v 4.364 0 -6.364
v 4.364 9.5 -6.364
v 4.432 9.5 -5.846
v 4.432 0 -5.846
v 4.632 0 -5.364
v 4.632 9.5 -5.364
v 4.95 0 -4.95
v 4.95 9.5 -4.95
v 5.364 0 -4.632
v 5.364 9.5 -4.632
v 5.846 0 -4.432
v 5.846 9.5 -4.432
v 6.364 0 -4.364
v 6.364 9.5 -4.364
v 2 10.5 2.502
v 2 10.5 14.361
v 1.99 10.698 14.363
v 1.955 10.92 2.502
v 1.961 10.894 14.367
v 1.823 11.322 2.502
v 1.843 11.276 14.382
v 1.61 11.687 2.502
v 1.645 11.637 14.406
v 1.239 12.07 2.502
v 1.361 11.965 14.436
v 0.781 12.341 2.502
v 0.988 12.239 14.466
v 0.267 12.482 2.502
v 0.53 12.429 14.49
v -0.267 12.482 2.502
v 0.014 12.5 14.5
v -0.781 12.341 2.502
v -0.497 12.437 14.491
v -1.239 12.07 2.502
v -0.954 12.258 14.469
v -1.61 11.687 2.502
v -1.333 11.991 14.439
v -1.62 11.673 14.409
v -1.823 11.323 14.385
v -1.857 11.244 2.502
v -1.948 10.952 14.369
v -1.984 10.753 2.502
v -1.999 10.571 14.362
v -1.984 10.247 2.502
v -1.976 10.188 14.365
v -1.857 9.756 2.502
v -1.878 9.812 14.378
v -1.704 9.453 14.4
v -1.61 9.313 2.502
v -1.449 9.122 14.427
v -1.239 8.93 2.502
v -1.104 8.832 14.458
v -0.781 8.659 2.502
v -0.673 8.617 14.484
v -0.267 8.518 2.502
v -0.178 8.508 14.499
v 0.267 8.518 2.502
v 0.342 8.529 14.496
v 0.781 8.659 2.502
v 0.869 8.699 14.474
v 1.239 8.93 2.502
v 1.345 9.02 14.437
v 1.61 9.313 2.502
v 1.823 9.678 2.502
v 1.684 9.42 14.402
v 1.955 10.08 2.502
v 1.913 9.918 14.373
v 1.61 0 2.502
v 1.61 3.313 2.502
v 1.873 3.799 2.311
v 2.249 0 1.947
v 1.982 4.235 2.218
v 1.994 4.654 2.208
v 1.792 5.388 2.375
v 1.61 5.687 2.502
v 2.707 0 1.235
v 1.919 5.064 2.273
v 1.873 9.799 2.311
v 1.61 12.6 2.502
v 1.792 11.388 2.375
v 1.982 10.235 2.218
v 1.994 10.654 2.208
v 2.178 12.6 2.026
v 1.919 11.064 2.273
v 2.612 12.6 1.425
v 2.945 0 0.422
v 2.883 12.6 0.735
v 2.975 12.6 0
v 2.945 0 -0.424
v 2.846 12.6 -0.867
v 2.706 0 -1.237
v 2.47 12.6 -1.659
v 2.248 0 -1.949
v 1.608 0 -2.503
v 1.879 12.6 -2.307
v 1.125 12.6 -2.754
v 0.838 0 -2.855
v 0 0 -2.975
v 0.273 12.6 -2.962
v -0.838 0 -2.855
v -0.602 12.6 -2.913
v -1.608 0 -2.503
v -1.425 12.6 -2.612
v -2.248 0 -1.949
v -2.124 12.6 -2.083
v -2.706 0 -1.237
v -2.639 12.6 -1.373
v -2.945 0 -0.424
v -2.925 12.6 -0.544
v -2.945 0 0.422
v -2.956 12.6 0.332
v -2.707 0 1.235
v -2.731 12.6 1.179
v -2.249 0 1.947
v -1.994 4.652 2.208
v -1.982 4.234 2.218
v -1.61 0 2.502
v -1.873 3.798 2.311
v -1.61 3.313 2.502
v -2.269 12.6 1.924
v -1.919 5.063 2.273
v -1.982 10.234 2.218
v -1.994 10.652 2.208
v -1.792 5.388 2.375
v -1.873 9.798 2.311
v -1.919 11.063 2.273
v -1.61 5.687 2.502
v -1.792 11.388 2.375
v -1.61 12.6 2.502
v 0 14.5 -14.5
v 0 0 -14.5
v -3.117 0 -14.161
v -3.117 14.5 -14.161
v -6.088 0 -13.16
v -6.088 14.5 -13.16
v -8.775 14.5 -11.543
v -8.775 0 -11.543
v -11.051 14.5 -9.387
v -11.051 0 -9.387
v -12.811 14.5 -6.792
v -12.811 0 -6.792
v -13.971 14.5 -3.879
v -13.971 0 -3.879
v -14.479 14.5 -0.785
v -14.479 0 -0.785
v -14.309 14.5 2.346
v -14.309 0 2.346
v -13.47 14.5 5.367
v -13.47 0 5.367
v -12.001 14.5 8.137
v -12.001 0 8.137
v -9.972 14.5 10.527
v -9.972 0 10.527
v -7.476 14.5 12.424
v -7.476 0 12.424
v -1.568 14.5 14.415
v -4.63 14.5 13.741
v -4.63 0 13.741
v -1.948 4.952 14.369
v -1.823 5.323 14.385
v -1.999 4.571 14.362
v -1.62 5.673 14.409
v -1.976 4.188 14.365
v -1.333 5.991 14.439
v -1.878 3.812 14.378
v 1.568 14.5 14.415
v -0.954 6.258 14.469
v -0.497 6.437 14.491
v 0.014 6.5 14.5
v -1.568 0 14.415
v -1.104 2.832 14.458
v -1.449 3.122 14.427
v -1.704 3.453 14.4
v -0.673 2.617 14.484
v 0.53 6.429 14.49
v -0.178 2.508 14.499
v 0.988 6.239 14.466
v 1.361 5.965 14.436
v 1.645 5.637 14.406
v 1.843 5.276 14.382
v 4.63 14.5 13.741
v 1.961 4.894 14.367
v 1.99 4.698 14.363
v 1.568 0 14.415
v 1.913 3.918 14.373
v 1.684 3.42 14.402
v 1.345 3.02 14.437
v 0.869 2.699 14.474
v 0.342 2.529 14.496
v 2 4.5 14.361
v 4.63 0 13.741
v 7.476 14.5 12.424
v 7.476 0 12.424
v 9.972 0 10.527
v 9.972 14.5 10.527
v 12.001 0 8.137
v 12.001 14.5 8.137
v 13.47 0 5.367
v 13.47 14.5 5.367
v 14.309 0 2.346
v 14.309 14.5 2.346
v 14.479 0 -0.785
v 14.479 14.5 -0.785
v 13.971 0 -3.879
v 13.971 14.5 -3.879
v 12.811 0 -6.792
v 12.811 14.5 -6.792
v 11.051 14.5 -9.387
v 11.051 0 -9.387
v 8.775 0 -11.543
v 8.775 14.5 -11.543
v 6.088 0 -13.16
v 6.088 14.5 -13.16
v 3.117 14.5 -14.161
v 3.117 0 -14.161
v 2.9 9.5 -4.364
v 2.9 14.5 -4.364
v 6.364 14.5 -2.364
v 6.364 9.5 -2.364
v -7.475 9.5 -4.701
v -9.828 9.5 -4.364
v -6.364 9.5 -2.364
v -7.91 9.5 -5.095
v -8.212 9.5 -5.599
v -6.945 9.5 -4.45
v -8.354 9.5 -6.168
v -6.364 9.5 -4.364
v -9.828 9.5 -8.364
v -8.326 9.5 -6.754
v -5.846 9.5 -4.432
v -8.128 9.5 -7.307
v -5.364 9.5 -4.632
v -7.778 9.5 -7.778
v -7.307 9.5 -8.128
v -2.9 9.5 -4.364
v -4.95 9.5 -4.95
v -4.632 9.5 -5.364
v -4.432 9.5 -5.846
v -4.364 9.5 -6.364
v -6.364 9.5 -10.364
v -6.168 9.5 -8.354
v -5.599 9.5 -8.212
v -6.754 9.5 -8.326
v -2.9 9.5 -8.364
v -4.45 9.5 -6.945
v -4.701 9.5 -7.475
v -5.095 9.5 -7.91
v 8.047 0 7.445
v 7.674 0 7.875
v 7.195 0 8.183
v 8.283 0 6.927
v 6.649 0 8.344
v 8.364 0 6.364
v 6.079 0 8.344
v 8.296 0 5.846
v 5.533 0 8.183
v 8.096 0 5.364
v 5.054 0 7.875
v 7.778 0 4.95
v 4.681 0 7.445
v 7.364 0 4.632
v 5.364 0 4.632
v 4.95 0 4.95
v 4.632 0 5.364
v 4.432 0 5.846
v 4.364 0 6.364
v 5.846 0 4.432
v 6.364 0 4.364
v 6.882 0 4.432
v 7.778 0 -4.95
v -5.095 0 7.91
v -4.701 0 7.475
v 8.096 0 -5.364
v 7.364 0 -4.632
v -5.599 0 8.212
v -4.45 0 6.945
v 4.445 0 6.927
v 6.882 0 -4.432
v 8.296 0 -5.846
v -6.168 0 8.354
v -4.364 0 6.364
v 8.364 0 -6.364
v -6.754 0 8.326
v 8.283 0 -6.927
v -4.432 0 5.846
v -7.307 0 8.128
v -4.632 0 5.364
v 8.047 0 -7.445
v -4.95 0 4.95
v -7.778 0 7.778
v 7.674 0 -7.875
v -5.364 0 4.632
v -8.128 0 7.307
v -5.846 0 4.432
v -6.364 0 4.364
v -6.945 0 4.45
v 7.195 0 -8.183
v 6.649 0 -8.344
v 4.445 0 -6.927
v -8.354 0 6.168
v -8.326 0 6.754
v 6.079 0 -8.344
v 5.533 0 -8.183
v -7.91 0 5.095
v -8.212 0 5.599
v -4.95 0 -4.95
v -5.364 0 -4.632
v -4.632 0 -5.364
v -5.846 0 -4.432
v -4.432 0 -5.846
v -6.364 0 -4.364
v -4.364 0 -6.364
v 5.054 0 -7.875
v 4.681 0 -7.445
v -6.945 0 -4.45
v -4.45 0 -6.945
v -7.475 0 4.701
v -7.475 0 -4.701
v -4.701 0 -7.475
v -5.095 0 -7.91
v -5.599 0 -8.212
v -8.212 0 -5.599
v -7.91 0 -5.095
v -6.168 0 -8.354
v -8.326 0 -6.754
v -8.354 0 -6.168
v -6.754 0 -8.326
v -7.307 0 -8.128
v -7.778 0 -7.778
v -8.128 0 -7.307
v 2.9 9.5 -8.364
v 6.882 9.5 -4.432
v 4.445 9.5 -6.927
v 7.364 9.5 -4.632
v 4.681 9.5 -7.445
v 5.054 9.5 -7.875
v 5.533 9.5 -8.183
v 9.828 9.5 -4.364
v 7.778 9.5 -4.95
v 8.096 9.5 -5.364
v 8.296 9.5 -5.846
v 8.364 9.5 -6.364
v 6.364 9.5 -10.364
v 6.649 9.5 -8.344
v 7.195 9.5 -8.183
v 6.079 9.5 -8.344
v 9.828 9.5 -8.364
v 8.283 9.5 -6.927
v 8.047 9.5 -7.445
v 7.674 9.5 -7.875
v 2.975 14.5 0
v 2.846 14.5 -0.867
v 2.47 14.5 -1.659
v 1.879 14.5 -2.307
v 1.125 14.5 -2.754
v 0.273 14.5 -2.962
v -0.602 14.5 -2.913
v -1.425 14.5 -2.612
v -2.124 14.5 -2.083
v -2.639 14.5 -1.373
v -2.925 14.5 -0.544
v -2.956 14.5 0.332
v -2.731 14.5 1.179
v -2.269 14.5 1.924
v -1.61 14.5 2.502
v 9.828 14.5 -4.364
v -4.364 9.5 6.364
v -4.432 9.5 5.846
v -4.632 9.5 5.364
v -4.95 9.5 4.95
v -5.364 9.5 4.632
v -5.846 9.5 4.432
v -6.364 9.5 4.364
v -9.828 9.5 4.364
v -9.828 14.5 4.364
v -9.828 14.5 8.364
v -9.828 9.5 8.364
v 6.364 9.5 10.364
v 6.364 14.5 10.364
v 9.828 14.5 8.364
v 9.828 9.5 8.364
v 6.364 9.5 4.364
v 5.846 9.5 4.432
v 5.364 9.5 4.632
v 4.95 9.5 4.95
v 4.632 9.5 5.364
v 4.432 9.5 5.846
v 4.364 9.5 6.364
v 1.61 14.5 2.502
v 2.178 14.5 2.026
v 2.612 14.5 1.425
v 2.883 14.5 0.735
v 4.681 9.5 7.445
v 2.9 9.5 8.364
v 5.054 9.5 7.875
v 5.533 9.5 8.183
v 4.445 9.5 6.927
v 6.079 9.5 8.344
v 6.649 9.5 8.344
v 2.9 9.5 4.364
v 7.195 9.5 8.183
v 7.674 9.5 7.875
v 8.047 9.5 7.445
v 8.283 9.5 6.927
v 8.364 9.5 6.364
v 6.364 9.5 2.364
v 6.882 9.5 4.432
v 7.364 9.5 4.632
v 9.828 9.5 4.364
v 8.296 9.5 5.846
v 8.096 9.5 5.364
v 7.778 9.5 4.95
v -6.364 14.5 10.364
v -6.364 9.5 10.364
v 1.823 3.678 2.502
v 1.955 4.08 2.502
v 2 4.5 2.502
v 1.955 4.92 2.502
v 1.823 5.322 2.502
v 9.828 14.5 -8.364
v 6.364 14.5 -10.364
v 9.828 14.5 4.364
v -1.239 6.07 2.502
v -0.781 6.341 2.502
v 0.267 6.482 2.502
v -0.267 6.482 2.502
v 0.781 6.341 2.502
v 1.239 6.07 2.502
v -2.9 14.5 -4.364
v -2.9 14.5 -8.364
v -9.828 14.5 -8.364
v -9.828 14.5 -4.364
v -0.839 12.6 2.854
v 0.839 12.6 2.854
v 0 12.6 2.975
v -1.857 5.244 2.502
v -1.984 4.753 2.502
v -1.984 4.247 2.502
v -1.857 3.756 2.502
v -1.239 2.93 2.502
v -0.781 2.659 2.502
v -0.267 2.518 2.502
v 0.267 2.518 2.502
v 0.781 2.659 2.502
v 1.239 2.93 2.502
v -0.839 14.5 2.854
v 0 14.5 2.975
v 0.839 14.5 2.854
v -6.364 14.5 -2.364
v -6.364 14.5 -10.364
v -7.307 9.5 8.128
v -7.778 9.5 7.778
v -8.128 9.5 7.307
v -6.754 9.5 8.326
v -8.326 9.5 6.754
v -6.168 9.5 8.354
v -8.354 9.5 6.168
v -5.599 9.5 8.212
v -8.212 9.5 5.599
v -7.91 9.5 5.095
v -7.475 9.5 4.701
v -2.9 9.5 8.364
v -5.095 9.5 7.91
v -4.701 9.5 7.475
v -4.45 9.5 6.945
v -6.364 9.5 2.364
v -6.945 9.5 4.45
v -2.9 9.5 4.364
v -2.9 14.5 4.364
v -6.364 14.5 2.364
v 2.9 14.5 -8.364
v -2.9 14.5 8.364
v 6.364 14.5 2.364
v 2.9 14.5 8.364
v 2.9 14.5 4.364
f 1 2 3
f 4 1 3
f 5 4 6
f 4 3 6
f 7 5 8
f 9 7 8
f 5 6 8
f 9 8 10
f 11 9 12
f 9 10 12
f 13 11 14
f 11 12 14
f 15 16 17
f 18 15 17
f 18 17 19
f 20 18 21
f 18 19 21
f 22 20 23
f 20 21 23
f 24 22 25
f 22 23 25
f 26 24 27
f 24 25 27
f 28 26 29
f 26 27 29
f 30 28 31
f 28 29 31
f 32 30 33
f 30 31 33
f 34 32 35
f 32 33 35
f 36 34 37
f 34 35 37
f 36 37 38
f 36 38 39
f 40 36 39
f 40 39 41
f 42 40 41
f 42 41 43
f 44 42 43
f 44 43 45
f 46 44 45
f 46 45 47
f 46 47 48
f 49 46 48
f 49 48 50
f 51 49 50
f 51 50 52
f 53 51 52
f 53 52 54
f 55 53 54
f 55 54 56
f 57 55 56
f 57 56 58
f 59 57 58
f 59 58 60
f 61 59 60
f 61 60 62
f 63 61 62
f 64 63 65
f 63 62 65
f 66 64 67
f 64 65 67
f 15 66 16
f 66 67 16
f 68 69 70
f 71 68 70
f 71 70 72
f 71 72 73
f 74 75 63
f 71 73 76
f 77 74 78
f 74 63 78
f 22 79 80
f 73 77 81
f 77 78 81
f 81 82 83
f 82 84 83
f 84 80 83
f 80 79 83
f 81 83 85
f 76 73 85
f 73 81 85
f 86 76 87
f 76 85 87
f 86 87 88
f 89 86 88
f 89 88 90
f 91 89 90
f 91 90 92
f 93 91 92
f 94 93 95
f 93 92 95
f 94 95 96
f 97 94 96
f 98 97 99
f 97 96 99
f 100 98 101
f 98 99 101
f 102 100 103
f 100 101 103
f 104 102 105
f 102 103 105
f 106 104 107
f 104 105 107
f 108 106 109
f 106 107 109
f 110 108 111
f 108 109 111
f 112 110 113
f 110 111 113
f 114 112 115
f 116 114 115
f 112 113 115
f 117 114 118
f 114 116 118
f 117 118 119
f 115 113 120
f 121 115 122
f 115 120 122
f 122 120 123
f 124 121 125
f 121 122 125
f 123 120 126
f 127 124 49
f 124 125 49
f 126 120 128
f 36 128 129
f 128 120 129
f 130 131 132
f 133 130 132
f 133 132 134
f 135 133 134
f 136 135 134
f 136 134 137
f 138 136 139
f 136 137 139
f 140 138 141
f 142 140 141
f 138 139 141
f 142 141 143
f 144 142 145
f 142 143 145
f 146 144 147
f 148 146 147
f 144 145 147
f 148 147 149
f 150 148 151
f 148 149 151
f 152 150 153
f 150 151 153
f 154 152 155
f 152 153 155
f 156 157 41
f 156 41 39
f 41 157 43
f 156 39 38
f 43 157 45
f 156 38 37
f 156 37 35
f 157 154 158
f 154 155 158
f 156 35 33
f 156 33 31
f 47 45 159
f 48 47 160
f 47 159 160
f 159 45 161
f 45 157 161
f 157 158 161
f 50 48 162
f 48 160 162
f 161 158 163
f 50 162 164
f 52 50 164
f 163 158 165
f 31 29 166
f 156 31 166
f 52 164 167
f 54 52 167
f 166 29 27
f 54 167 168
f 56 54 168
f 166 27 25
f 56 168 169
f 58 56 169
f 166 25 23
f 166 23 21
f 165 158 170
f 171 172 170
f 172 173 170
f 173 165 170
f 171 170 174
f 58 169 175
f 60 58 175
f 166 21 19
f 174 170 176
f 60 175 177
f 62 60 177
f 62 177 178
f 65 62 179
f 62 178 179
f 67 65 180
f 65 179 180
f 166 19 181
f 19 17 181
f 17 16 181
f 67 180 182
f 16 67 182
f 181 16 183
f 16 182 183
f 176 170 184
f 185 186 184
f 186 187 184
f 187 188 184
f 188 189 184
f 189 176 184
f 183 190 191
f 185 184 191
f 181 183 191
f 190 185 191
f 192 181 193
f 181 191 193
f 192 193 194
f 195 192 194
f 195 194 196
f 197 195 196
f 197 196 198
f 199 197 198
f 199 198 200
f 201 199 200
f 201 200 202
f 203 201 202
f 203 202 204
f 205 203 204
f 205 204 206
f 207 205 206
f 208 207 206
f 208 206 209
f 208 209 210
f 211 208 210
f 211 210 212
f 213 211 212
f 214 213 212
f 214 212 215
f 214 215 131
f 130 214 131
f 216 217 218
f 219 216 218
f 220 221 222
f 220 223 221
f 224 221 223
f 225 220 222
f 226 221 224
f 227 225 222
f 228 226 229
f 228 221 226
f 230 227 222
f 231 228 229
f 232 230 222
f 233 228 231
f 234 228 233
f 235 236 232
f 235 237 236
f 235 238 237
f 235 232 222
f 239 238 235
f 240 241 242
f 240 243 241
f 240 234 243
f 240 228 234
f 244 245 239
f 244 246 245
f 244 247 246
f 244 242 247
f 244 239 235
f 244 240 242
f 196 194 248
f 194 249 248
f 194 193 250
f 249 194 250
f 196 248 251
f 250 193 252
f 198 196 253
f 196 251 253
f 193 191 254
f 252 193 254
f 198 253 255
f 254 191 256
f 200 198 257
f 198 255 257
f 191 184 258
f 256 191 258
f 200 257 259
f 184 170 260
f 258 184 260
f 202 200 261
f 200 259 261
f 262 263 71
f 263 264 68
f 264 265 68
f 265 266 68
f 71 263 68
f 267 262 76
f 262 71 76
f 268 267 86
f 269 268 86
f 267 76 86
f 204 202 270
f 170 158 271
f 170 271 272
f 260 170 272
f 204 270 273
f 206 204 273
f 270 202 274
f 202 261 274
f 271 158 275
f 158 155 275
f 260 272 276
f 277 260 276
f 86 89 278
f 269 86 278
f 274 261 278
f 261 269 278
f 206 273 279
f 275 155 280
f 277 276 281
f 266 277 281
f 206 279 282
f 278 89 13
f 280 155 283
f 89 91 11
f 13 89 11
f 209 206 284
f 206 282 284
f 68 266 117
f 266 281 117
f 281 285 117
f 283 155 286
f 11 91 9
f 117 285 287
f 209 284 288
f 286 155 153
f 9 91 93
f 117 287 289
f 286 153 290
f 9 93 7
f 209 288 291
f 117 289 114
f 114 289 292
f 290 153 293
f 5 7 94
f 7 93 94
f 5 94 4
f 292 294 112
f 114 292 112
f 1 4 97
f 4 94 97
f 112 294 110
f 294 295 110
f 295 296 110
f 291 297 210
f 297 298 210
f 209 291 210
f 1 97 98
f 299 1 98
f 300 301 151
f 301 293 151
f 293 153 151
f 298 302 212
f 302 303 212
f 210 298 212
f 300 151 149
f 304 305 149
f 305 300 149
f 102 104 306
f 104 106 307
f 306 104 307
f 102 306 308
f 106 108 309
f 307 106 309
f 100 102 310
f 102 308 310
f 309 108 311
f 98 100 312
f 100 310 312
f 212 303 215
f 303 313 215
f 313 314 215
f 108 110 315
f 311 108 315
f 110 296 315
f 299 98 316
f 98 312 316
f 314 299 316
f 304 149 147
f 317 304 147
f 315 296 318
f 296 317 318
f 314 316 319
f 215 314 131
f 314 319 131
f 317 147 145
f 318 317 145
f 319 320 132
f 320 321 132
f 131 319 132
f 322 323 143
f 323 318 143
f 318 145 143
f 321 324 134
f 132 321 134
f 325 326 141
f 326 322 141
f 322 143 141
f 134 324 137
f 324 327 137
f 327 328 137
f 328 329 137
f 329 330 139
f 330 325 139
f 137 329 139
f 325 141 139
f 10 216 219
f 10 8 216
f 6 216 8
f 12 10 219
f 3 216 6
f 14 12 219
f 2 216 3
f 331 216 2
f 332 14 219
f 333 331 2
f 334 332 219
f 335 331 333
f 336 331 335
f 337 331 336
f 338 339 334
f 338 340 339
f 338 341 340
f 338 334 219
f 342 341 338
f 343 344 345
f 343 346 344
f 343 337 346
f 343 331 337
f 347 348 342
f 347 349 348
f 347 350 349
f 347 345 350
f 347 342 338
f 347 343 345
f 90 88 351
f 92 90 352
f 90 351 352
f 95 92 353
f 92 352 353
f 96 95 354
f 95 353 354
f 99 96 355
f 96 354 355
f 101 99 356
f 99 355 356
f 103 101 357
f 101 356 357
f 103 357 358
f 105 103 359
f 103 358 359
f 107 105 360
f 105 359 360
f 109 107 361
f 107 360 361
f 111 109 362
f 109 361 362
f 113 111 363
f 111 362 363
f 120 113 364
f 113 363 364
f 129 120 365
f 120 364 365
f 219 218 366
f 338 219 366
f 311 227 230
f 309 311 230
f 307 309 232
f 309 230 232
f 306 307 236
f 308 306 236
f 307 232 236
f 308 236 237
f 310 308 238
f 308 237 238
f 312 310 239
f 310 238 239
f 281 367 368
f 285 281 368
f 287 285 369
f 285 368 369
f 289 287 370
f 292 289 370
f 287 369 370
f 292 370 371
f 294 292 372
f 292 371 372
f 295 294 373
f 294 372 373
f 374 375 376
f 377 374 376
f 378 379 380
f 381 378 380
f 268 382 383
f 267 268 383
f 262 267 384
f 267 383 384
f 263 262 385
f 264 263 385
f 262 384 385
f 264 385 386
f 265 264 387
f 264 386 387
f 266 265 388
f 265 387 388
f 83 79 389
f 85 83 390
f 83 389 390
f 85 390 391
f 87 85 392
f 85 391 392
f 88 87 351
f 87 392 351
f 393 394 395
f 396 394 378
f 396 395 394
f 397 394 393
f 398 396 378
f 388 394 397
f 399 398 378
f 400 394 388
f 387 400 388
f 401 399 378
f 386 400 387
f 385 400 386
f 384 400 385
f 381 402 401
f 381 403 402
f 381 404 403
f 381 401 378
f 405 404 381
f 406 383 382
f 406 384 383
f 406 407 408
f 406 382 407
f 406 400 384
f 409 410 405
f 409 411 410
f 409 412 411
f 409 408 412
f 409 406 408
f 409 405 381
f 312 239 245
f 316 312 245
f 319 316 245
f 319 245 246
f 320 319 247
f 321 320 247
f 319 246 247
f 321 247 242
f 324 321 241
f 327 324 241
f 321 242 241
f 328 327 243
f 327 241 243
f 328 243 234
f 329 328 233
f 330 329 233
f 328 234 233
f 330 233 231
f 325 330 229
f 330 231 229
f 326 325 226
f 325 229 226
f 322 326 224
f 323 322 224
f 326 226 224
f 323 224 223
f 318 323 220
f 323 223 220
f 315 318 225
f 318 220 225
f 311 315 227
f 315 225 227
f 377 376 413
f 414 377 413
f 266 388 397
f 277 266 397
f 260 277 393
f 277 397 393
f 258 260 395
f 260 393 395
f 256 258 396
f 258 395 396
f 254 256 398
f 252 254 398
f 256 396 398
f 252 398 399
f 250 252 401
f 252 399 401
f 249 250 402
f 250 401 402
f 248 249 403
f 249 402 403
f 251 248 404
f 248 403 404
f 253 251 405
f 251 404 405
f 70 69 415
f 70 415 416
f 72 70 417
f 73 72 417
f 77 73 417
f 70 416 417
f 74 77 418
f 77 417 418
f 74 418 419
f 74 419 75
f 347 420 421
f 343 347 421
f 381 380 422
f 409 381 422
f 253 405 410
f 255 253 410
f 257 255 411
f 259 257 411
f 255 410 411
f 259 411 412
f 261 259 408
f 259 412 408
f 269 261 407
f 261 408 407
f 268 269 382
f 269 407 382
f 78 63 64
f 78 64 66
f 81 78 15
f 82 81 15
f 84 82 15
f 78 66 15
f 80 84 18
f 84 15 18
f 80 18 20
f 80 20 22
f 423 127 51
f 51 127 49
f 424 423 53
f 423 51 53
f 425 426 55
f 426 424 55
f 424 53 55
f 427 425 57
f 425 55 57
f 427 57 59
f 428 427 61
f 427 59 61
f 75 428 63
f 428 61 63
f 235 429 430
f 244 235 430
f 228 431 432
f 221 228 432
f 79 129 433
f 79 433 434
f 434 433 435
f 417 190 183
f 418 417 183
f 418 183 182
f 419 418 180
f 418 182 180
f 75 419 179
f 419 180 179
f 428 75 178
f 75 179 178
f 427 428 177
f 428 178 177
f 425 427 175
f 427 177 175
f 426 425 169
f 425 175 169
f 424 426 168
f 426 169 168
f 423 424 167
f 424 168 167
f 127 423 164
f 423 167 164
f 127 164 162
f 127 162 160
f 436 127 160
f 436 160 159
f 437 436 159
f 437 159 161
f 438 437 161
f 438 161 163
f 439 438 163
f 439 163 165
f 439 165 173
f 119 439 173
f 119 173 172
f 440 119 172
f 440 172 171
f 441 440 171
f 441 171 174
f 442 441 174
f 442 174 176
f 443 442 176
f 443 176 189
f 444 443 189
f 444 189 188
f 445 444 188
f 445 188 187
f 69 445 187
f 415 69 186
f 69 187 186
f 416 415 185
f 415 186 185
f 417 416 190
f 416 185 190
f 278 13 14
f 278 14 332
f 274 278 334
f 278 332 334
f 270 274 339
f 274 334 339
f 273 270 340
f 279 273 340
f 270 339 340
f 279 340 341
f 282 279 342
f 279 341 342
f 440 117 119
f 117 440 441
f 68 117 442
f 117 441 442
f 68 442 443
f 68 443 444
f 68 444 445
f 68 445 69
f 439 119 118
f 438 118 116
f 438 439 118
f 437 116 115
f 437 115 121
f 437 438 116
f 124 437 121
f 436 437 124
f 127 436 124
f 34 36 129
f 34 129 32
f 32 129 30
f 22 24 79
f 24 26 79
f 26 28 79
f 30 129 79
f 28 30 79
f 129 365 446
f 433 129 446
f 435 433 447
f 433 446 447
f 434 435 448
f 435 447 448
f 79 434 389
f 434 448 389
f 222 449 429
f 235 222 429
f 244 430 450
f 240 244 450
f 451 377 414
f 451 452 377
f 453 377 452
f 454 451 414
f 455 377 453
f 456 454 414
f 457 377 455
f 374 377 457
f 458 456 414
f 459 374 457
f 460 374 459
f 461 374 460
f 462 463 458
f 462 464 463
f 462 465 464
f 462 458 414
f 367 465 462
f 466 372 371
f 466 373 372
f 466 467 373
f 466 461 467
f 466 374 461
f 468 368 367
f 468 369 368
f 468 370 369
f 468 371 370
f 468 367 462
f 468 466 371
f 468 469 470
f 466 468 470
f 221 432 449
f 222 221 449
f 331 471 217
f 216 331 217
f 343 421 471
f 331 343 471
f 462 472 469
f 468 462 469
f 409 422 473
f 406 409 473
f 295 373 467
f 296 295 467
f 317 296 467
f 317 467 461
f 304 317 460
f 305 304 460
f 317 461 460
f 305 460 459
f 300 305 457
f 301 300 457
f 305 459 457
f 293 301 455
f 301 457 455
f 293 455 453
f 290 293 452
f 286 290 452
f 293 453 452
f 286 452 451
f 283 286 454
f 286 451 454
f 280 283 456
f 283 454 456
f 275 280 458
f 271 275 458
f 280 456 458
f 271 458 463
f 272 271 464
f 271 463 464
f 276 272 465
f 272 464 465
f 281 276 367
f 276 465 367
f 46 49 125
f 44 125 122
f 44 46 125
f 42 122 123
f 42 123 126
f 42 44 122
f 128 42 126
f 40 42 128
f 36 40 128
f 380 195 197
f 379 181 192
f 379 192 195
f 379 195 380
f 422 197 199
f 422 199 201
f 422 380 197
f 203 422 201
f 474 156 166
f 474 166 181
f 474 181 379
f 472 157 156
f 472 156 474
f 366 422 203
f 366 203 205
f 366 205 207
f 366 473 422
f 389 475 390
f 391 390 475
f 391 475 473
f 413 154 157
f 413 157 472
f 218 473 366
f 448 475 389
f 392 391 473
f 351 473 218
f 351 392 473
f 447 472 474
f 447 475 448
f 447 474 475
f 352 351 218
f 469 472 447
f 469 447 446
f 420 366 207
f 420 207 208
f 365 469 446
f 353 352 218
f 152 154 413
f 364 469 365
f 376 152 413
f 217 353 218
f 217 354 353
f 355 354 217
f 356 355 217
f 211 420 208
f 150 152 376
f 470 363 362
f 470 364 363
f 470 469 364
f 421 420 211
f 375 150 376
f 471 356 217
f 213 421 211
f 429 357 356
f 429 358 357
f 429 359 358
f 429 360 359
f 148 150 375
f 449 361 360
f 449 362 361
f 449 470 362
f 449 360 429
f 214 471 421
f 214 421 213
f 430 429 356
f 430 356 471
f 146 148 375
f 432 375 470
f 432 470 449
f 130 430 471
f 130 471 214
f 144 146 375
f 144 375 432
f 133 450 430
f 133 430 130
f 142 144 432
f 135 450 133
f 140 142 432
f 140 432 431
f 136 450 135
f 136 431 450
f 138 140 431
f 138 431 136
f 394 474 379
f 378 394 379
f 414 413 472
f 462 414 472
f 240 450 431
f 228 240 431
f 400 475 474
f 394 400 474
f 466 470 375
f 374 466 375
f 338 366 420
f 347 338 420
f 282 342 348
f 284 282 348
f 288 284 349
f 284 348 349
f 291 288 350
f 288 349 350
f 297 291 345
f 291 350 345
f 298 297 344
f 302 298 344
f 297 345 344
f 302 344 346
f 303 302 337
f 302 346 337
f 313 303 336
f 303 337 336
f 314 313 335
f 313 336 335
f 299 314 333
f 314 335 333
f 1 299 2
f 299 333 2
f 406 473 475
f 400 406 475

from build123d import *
from build123d.topology import SkipClean

# Parameters (mm, degrees)
CROQUIS1_R              = 14.5
SALIENTE_EXTRUIR1_DEPTH = 14.5
CORTAR_EXTRUIR1_DEPTH   = 26.11473671
CORTAR_EXTRUIR2_DEPTH   = 26.11473671
CORTAR_EXTRUIR3_DEPTH   = 5
MATRIZL1_COUNT          = 2
MATRIZL1_PITCH          = 12.728
MATRIZL1_COUNT_DIR2     = 2
MATRIZL1_PITCH_DIR2     = 12.728
CROQUIS6_R              = 2
CORTAR_EXTRUIR4_DEPTH   = 11.998295581
CORTAR_EXTRUIR5_DEPTH   = 1
CORTAR_EXTRUIR9_DEPTH   = 1.9


with BuildPart() as part:
    # Croquis1 → Saliente-Extruir1 (new body)
    with BuildSketch(Plane(origin=(0, 0, 0), x_dir=(1, 0, 0), z_dir=(0, 1, 0))):
        with Locations(Location((0, 0, 0), (0, 0, 90))):
            Circle(CROQUIS1_R)
    extrude(amount=SALIENTE_EXTRUIR1_DEPTH)

    # Croquis2 → Cortar-Extruir1 (cut, through all)
    with BuildSketch(Plane(origin=(0, 14.5, 0), x_dir=(1, 0, 0), z_dir=(0, 1, 0))):
        with BuildLine():
            Line((-1.61, -2.501704419), (1.61, -2.501704419))
            ThreePointArc((1.61, -2.501704419), (0, 2.975), (-1.61, -2.501704419))
        make_face()
    extrude(amount=-CORTAR_EXTRUIR1_DEPTH, mode=Mode.SUBTRACT)

    # Croquis3 → Cortar-Extruir2 (cut, through all)
    with BuildSketch(Plane(origin=(0, 14.5, 0), x_dir=(1, 0, 0), z_dir=(0, 1, 0))):
        with BuildLine():
            ThreePointArc((-4.364, 6.364), (-7.778213562, 7.778213562), (-6.364, 4.364))
            Line((-6.364, 4.364), (-6.364, 6.364))
            Line((-6.364, 6.364), (-4.364, 6.364))
        make_face()
        with BuildLine():
            Line((-6.364, 6.364), (-6.364, 4.364))
            ThreePointArc((-6.364, 4.364), (-4.949786438, 4.949786438), (-4.364, 6.364))
            Line((-4.364, 6.364), (-6.364, 6.364))
        make_face()
        with BuildLine():
            Line((-6.364, -4.364), (-6.364, -6.364))
            Line((-6.364, -6.364), (-4.364, -6.364))
            ThreePointArc((-4.364, -6.364), (-4.949786438, -4.949786438), (-6.364, -4.364))
        make_face()
        with BuildLine():
            Line((-4.364, -6.364), (-6.364, -6.364))
            Line((-6.364, -6.364), (-6.364, -4.364))
            ThreePointArc((-6.364, -4.364), (-7.778213562, -7.778213562), (-4.364, -6.364))
        make_face()
        with BuildLine():
            ThreePointArc((6.364, -4.364), (4.949786438, -4.949786438), (4.364, -6.364))
            Line((4.364, -6.364), (6.364, -6.364))
            Line((6.364, -6.364), (6.364, -4.364))
        make_face()
        with BuildLine():
            Line((6.364, -6.364), (4.364, -6.364))
            ThreePointArc((4.364, -6.364), (6.364, -8.364), (8.364, -6.364))
            ThreePointArc((8.364, -6.364), (7.778213562, -4.949786438), (6.364, -4.364))
            Line((6.364, -4.364), (6.364, -6.364))
        make_face()
        with BuildLine():
            ThreePointArc((4.364, 6.364), (4.949786438, 4.949786438), (6.364, 4.364))
            Line((6.364, 4.364), (6.364, 6.364))
            Line((6.364, 6.364), (4.364, 6.364))
        make_face()
        with BuildLine():
            Line((6.364, 6.364), (6.364, 4.364))
            ThreePointArc((6.364, 4.364), (7.778213562, 4.949786438), (8.364, 6.364))
            ThreePointArc((8.364, 6.364), (6.364, 8.364), (4.364, 6.364))
            Line((4.364, 6.364), (6.364, 6.364))
        make_face()
    extrude(amount=-CORTAR_EXTRUIR2_DEPTH, mode=Mode.SUBTRACT)

    # Croquis5 → Cortar-Extruir3 (cut)
    with BuildSketch(Plane(origin=(0, 14.5, 0), x_dir=(1, 0, 0), z_dir=(0, 1, 0))):
        Polygon((-6.364, 2.364), (-2.899898385, 4.364), (-2.899898385, 8.364), (-6.364, 10.364), (-9.828101615, 8.364), (-9.828101615, 4.364), align=None)
    cortar_extruir3 = extrude(amount=-CORTAR_EXTRUIR3_DEPTH, mode=Mode.SUBTRACT)

    # MatrizL1: Cortar-Extruir3 2 × 2
    with Locations(*[(i * MATRIZL1_PITCH, 0, j * MATRIZL1_PITCH_DIR2) for i in range(MATRIZL1_COUNT) for j in range(MATRIZL1_COUNT_DIR2) if (i, j) != (0, 0)]):
        add(cortar_extruir3, mode=Mode.SUBTRACT)

    # Croquis6 → Cortar-Extruir4 (cut)
    with BuildSketch(Plane.XY.offset(14.5)):
        with Locations((0, 10.5)):
            Circle(CROQUIS6_R)
        with Locations((0, 4.5)):
            Circle(CROQUIS6_R)
    extrude(amount=-CORTAR_EXTRUIR4_DEPTH, mode=Mode.SUBTRACT)

    # Croquis9 → Cortar-Extruir5 (cut)
    with SkipClean():  # the faces are left unmerged after this step: merging them gives an invalid solid
        with BuildSketch(Plane.XY.offset(2.501704419)):
            with BuildLine():
                Line((-1.61, 11.68654962), (-1.61, 9.31345038))
                ThreePointArc((-1.61, 9.31345038), (-2, 10.5), (-1.61, 11.68654962))
            make_face()
            with BuildLine():
                Line((1.61, 11.68654962), (1.61, 9.31345038))
                ThreePointArc((1.61, 9.31345038), (2, 10.5), (1.61, 11.68654962))
            make_face()
            with BuildLine():
                Line((-1.61, 5.68654962), (-1.61, 3.31345038))
                ThreePointArc((-1.61, 3.31345038), (-2, 4.5), (-1.61, 5.68654962))
            make_face()
            with BuildLine():
                Line((1.61, 5.68654962), (1.61, 3.31345038))
                ThreePointArc((1.61, 3.31345038), (2, 4.5), (1.61, 5.68654962))
            make_face()
        extrude(amount=-CORTAR_EXTRUIR5_DEPTH, mode=Mode.SUBTRACT)

    # Croquis11 → Cortar-Extruir9 (cut)
    with SkipClean():  # the faces are left unmerged after this step: merging them gives an invalid solid
        with BuildSketch(Plane(origin=(0, 14.5, 0), x_dir=(1, 0, 0), z_dir=(0, 1, 0))):
            with BuildLine():
                ThreePointArc((2.975, 0), (-1.424934209, 2.61154887), (-1.61, -2.501704419))
                Line((-1.61, -2.501704419), (1.61, -2.501704419))
                ThreePointArc((1.61, -2.501704419), (2.61154887, -1.424934209), (2.975, 0))
            make_face()
            with BuildLine():
                Line((1.61, -2.501704419), (-1.61, -2.501704419))
                ThreePointArc((-1.61, -2.501704419), (0, -2.975), (1.61, -2.501704419))
            make_face()
        extrude(amount=-CORTAR_EXTRUIR9_DEPTH, mode=Mode.SUBTRACT)


solid = part.part
